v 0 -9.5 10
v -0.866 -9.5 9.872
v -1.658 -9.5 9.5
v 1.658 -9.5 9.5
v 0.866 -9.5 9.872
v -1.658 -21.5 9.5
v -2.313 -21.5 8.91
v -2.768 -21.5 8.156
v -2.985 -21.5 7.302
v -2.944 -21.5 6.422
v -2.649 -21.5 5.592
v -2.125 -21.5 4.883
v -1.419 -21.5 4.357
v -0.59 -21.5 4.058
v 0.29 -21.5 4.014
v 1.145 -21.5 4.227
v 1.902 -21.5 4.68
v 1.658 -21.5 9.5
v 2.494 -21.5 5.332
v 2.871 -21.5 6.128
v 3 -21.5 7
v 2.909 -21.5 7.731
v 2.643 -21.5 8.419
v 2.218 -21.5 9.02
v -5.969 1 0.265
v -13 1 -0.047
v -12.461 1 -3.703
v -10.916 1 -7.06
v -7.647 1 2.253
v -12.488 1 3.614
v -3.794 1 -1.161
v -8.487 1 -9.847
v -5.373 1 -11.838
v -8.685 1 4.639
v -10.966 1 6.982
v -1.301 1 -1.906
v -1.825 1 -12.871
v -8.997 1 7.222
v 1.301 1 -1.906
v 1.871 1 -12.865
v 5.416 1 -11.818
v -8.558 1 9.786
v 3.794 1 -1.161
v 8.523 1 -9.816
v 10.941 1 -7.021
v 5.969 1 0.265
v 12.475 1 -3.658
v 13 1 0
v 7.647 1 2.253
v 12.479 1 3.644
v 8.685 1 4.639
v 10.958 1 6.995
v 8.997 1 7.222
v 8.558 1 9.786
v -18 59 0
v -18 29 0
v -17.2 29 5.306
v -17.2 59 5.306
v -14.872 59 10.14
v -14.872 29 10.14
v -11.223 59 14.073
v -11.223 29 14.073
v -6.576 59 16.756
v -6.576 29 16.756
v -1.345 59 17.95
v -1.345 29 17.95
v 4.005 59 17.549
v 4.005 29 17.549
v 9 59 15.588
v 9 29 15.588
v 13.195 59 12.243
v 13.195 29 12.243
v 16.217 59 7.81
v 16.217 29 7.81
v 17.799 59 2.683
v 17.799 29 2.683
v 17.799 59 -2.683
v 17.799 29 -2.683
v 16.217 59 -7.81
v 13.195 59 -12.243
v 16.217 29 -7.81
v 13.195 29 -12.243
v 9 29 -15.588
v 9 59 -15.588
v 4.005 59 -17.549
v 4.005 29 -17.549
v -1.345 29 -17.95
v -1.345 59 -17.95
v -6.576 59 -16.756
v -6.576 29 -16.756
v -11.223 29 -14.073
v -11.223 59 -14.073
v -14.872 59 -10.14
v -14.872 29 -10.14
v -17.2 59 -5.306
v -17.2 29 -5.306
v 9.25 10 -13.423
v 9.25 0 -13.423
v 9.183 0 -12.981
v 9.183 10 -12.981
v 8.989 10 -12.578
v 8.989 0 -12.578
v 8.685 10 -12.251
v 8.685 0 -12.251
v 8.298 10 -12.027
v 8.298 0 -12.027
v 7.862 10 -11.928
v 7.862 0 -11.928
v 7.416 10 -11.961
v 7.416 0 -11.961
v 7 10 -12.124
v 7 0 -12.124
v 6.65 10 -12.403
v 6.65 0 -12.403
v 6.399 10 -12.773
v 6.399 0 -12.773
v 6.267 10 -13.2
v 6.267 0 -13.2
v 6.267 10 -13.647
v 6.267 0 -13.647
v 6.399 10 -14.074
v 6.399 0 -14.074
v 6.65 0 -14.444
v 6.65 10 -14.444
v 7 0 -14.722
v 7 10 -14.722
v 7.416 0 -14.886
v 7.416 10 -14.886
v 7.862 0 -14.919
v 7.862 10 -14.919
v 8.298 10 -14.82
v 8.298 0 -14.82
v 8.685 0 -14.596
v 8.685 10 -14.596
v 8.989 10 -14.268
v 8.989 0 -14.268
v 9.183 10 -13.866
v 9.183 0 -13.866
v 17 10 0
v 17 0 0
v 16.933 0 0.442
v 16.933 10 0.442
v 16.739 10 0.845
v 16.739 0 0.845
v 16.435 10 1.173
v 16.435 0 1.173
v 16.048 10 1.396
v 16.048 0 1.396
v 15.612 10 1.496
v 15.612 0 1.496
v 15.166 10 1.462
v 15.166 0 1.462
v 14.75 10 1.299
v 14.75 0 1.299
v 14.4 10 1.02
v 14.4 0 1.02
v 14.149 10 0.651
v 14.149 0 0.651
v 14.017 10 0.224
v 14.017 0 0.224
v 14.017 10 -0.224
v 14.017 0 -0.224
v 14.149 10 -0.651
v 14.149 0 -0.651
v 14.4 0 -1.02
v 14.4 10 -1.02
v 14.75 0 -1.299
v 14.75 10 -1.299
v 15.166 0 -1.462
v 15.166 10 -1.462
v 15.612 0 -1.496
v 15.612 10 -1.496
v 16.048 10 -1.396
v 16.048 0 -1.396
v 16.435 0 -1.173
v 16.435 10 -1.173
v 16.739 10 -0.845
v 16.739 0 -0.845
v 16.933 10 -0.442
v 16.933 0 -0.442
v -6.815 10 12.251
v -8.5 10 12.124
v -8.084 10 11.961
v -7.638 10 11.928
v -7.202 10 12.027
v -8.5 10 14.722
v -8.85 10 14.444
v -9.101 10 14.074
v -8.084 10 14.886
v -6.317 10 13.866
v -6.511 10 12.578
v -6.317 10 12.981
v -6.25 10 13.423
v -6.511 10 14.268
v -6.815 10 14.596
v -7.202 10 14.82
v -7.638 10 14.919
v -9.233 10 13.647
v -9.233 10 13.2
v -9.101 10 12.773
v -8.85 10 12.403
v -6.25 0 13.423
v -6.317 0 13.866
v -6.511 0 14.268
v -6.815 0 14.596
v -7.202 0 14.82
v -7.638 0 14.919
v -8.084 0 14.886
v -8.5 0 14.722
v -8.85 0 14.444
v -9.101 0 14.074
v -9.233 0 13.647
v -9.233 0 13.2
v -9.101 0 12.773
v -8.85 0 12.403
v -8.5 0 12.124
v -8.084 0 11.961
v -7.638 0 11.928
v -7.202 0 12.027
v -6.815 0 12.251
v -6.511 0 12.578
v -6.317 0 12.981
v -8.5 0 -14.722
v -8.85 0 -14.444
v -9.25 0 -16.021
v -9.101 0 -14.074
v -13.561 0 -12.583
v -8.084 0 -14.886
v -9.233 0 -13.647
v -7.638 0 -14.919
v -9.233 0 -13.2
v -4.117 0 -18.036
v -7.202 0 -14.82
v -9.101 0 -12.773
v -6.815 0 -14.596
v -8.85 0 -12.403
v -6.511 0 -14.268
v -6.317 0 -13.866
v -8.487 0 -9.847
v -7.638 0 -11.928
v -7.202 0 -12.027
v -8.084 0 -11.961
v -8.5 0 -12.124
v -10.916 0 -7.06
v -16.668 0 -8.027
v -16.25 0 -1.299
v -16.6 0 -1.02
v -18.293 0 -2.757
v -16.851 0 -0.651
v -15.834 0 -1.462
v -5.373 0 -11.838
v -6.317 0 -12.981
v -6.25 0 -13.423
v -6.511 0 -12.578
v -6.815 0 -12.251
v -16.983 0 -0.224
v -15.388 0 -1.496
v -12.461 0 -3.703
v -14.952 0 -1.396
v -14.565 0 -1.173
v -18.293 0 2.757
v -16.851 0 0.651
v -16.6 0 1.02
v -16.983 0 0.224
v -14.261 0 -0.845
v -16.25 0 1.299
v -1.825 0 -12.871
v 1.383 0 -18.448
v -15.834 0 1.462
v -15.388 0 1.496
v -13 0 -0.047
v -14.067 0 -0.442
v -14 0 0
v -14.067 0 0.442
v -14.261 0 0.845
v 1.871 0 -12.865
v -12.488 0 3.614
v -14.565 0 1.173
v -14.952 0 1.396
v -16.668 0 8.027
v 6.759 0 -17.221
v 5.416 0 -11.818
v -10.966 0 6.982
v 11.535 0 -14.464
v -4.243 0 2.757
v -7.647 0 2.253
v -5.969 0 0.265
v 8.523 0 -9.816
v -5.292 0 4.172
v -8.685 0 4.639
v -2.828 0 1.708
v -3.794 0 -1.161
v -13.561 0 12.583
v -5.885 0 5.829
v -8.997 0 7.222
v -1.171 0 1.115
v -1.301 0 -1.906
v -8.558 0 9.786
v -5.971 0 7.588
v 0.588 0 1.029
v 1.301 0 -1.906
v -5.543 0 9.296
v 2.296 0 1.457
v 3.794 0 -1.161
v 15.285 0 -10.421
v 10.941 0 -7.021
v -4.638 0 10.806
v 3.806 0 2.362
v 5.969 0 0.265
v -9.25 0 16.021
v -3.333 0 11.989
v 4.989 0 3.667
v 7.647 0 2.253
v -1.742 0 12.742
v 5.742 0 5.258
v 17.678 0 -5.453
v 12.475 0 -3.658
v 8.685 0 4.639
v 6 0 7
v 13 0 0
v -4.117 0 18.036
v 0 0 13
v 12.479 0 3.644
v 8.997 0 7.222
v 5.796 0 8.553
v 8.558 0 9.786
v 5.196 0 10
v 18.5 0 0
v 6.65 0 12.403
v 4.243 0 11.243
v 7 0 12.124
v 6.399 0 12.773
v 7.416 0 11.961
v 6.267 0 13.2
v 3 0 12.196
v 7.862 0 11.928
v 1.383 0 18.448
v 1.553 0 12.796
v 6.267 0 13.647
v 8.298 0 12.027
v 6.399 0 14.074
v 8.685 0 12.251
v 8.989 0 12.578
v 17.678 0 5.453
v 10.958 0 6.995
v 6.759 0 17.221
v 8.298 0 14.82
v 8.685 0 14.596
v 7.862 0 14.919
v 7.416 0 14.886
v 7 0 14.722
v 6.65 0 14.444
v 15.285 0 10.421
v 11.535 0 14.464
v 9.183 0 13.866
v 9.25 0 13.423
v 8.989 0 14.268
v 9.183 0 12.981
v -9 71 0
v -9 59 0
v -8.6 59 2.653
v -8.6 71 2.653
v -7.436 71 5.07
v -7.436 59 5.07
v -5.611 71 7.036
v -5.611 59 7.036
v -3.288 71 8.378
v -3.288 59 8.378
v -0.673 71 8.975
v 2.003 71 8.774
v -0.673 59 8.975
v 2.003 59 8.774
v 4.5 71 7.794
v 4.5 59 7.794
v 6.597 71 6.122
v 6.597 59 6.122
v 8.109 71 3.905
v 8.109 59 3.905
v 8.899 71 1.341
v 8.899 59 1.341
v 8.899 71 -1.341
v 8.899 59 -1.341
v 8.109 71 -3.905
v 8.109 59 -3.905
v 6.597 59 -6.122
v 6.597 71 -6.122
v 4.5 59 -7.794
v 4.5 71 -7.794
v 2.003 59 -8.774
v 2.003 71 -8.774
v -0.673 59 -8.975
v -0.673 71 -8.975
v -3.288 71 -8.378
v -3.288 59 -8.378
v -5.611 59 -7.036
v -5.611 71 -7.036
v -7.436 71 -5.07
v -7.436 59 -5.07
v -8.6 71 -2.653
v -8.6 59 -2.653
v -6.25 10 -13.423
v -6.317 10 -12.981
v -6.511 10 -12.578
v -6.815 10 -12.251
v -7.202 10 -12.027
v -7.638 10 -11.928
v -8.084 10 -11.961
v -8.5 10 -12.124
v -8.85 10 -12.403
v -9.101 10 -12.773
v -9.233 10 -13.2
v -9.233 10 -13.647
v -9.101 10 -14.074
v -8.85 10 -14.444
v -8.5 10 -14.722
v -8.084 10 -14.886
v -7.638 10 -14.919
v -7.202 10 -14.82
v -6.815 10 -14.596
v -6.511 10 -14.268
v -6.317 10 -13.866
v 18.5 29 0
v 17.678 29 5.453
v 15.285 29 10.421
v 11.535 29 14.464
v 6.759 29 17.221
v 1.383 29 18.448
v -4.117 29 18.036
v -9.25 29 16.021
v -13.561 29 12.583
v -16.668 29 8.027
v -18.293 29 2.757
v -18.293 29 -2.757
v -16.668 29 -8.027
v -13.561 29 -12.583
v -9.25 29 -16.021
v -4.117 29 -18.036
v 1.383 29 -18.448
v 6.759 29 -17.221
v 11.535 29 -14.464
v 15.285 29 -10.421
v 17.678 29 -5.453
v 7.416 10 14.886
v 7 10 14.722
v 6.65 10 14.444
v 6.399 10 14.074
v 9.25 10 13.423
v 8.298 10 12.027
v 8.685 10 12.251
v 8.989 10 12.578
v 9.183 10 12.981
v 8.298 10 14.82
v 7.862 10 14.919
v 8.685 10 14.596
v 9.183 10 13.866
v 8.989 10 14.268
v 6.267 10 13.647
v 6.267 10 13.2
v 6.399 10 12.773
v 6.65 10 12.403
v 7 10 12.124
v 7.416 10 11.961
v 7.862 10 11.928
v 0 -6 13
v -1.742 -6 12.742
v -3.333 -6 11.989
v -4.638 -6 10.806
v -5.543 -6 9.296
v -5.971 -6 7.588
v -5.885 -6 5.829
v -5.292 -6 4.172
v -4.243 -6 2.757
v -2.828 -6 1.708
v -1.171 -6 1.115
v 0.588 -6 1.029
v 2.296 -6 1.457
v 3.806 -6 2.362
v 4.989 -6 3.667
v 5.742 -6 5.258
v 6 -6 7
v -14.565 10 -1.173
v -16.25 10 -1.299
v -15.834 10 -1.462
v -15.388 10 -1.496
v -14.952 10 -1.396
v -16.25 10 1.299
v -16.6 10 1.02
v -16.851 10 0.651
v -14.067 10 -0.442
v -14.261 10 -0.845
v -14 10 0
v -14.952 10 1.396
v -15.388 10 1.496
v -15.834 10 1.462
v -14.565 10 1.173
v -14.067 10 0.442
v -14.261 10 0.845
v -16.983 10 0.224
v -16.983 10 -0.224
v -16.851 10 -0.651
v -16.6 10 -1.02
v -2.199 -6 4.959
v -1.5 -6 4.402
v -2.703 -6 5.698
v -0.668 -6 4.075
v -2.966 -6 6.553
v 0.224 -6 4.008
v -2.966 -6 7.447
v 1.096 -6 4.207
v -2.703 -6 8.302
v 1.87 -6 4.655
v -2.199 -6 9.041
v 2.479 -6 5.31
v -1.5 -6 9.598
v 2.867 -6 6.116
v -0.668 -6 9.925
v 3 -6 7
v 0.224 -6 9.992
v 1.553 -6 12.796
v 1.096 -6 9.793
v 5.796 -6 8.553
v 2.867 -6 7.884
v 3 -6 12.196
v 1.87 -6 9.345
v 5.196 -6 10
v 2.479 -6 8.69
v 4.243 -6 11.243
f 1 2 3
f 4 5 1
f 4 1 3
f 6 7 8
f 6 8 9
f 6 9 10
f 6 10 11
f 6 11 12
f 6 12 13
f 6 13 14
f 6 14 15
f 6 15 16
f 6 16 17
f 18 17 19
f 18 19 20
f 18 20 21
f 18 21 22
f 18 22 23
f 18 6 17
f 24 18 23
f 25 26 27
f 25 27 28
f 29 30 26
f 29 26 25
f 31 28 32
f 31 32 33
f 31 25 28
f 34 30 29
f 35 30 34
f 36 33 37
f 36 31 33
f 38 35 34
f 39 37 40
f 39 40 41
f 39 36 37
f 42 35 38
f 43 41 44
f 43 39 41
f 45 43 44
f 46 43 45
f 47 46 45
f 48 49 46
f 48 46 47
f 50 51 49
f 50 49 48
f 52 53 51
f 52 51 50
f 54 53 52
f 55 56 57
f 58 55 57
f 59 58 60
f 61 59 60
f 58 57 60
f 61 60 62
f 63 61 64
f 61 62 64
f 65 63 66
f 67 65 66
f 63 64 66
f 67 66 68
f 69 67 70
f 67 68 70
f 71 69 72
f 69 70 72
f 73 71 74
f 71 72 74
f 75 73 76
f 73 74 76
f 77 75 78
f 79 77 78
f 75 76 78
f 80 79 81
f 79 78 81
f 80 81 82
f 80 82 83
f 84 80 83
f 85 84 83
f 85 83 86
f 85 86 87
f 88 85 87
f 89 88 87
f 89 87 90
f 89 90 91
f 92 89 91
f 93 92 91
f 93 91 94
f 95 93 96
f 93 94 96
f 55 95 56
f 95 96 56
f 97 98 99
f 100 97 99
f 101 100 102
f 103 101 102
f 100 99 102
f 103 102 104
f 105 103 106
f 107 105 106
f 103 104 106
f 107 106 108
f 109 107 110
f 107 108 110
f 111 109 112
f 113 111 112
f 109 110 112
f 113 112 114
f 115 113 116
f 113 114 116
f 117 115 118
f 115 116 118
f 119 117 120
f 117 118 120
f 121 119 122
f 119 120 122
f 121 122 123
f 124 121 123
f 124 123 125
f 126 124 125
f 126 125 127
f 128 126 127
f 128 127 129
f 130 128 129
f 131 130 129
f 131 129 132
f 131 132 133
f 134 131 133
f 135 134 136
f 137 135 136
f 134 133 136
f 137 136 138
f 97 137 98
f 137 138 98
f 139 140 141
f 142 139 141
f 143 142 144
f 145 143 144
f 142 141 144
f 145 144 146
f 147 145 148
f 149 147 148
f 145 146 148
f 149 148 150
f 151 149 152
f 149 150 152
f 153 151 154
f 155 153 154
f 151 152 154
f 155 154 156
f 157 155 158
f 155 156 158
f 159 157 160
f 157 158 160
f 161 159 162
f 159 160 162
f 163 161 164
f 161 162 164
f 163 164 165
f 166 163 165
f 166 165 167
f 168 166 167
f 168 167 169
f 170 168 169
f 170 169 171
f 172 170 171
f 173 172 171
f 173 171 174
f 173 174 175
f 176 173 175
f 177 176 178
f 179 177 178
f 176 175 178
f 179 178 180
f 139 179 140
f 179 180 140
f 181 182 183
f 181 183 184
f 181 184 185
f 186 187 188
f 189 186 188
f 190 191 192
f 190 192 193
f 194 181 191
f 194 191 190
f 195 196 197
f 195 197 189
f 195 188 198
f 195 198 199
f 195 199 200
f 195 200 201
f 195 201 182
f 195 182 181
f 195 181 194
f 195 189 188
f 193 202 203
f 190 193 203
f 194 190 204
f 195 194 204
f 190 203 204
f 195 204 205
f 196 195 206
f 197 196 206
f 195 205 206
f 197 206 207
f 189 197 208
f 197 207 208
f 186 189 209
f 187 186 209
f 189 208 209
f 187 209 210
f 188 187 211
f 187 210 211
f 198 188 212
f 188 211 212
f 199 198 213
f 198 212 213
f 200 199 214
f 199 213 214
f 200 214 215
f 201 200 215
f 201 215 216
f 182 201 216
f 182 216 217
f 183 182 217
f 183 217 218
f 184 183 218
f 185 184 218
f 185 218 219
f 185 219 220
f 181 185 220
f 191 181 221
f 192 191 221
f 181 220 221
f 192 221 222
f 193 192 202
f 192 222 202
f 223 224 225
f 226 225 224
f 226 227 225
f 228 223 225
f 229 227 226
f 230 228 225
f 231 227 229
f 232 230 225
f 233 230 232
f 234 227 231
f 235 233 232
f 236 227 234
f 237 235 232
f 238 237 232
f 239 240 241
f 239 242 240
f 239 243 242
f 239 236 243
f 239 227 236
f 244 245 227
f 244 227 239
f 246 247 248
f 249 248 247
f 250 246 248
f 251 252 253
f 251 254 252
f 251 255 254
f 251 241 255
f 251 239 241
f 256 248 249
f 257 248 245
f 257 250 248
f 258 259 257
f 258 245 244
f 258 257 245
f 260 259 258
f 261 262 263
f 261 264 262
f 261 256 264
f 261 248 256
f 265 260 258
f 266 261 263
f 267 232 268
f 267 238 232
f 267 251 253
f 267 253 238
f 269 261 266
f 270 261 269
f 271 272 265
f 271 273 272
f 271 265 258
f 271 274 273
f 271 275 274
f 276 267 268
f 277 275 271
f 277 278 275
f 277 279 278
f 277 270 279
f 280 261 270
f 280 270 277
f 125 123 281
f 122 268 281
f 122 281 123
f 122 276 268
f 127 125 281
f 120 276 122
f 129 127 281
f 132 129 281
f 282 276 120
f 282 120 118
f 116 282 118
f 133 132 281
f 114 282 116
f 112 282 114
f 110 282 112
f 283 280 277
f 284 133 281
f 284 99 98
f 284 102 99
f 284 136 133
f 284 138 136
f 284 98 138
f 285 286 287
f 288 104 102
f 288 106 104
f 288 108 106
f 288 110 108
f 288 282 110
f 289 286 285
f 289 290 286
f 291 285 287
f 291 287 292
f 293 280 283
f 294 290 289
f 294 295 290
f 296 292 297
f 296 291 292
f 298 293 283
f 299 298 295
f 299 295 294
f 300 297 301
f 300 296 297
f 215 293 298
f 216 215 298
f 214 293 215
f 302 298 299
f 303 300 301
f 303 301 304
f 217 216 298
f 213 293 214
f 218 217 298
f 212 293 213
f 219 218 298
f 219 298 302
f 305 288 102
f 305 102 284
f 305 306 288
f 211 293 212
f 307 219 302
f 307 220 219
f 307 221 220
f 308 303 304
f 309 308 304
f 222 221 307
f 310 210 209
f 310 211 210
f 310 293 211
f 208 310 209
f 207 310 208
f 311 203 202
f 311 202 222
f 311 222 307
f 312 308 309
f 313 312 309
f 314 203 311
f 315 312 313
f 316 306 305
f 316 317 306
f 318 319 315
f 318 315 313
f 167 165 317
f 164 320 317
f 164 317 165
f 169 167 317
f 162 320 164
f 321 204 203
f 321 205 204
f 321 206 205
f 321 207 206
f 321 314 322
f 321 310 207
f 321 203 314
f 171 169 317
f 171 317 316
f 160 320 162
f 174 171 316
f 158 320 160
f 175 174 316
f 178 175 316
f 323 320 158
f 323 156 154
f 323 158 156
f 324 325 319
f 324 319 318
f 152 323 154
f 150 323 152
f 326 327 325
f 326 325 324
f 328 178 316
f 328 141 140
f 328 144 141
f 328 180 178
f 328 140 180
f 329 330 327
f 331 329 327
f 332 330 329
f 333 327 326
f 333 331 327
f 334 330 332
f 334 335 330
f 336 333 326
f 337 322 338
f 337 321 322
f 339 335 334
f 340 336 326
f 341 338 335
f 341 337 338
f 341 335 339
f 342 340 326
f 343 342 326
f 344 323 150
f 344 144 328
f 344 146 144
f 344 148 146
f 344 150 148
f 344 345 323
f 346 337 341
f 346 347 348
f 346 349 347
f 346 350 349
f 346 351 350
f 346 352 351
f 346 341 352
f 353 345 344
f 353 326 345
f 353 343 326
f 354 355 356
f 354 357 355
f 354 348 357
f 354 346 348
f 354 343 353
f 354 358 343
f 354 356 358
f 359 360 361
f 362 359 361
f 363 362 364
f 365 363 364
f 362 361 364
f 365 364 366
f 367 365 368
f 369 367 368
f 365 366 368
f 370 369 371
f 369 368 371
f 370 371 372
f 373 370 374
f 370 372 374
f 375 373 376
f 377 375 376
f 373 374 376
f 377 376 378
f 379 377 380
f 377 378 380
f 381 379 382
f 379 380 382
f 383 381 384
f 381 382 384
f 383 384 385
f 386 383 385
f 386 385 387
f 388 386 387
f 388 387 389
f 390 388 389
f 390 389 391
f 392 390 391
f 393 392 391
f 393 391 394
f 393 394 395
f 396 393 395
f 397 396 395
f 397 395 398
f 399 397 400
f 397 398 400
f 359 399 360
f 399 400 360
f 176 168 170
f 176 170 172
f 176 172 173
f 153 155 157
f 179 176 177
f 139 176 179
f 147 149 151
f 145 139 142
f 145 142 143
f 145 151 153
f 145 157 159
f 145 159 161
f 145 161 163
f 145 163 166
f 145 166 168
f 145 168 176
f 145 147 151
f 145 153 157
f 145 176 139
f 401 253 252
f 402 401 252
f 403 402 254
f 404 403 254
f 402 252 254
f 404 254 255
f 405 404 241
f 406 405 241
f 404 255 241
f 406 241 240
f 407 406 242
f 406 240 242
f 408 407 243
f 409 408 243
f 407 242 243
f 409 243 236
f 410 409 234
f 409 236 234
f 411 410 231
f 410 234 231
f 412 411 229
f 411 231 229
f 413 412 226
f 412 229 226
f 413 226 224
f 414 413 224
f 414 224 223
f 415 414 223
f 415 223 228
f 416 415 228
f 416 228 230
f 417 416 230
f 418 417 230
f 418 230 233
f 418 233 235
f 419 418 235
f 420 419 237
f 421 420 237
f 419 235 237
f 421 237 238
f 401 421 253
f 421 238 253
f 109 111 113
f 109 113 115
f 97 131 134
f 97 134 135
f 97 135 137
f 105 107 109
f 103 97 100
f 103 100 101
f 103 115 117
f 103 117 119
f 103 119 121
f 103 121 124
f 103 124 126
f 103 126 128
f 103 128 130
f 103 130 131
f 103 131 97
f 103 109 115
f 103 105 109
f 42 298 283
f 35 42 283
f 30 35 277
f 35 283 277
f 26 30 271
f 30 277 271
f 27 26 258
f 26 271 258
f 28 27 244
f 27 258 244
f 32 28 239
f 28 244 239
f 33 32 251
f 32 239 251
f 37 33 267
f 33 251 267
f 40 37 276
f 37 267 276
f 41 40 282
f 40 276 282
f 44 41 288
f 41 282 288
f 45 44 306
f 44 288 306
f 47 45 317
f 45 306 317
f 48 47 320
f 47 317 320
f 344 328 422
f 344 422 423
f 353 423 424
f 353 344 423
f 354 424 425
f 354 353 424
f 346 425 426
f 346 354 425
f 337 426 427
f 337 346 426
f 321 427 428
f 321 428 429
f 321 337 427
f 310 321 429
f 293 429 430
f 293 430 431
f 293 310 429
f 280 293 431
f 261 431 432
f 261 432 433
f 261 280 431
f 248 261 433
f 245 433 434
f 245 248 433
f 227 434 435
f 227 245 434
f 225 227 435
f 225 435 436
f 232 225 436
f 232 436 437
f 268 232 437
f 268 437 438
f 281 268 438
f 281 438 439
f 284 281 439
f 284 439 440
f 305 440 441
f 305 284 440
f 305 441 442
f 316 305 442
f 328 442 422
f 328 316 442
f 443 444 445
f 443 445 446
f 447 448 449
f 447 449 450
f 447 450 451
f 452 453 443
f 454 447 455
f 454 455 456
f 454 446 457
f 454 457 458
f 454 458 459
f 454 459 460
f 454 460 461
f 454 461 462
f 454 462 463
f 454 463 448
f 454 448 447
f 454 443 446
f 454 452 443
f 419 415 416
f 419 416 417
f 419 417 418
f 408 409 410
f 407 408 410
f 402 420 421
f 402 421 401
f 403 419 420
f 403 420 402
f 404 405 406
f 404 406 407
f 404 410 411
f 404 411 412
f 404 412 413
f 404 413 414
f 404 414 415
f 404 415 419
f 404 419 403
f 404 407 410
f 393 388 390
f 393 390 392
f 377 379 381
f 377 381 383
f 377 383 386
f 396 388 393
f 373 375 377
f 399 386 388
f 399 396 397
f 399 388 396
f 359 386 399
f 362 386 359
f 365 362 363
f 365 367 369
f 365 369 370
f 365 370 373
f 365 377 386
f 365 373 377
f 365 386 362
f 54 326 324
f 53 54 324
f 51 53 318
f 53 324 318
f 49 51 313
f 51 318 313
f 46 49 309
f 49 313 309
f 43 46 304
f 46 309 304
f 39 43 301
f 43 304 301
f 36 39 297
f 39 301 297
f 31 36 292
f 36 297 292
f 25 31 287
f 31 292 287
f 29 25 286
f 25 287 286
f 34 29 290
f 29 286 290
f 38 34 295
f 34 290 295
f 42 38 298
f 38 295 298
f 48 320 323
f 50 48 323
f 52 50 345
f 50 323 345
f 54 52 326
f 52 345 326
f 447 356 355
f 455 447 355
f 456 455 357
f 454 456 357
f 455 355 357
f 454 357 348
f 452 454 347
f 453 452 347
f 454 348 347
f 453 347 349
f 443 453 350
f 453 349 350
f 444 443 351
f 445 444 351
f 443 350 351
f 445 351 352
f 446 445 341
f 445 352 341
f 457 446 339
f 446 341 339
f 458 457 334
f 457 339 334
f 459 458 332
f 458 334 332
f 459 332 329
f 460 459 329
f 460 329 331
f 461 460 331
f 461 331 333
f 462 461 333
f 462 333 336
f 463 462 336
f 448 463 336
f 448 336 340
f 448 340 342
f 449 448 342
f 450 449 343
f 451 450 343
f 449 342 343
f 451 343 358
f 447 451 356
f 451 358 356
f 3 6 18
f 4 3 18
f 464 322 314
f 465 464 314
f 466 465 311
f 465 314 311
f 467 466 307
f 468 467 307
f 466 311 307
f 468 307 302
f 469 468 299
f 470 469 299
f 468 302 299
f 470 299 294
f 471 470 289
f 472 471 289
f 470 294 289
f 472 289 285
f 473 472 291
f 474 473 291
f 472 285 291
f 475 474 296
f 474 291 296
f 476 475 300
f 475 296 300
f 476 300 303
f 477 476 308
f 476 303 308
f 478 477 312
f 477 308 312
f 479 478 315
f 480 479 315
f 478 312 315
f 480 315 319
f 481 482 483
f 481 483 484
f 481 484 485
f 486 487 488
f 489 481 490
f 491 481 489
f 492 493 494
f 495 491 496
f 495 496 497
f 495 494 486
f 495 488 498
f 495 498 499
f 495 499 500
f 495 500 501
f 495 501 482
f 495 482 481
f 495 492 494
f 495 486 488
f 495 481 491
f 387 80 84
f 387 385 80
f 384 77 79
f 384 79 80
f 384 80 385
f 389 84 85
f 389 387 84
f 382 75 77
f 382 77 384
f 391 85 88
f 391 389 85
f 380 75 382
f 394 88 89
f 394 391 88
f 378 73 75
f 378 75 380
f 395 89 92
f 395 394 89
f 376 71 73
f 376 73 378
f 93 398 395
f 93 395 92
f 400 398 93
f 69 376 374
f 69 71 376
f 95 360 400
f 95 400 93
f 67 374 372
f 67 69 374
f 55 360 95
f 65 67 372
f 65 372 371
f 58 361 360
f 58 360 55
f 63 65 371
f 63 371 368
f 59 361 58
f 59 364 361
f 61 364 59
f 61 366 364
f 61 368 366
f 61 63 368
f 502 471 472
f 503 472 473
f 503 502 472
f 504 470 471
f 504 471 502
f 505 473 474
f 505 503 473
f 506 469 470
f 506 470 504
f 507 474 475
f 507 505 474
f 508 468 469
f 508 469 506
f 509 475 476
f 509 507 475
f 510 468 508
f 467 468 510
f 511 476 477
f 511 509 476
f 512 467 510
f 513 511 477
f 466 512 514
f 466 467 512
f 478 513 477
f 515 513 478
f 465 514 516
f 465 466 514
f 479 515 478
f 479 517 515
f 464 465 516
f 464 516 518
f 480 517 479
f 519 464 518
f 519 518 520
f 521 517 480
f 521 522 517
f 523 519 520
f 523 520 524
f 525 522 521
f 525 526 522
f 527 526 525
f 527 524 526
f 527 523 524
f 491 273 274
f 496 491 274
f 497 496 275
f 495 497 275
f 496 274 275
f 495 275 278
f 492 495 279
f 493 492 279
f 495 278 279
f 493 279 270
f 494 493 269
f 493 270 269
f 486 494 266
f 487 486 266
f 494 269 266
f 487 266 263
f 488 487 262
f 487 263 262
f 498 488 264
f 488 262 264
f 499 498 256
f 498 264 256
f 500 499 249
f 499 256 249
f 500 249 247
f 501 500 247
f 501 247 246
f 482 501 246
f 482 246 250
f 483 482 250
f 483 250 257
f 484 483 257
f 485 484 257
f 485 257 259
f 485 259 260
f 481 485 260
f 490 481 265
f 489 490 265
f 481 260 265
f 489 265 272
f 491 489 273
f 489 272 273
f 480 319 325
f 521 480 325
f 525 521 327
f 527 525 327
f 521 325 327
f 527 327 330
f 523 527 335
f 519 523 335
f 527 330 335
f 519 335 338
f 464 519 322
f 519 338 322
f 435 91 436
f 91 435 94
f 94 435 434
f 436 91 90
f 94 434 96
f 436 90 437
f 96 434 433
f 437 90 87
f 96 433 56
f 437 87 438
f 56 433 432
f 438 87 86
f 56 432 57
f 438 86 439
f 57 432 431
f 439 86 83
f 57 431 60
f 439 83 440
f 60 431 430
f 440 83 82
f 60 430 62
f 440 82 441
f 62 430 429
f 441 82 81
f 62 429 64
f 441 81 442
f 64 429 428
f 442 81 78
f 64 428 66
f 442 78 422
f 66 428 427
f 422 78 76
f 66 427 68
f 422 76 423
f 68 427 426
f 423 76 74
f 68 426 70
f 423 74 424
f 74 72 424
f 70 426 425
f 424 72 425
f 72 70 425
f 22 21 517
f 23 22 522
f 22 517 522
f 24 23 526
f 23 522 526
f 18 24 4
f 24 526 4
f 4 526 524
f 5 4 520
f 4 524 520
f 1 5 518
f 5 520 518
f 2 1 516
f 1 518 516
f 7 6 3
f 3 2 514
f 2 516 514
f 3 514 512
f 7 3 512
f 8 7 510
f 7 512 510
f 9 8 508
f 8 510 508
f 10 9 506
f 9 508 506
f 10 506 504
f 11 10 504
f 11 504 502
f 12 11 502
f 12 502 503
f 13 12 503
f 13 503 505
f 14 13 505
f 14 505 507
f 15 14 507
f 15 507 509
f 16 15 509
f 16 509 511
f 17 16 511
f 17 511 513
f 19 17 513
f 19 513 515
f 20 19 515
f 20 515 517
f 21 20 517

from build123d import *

# Parameters (mm, degrees)
F0_R      = 18.5
F0_R_2    = 18
F0_R_3    = 1.5
F0_R_4    = 3
F1_DEPTH  = 29
F2_R      = 18
F3_DEPTH  = 30
F4_R      = 9
F5_DEPTH  = 12
F6_DEPTH  = 6
F7_DEPTH  = 21.5
F8_DEPTH  = 10
F10_DEPTH = 12
F11_DEPTH = 1


with BuildPart() as f1:
    # F0 (on Front) → F1 (new body)
    with BuildSketch(Plane.XZ):
        Circle(F0_R)
        Circle(F0_R_2, mode=Mode.SUBTRACT)
        Circle(F0_R_2)
        with Locations((-7.75, -13.4233937587)):
            Circle(F0_R_3, mode=Mode.SUBTRACT)
        with Locations((7.75, -13.4233937587)):
            Circle(F0_R_3, mode=Mode.SUBTRACT)
        with Locations((-15.5, 0)):
            Circle(F0_R_3, mode=Mode.SUBTRACT)
        with Locations((-7.75, 13.4233937587)):
            Circle(F0_R_3, mode=Mode.SUBTRACT)
        with BuildLine():
            ThreePointArc((-8.5580252347, 9.7857142857), (-4.5708705218, 12.1699278007), (-4.3e-08, 13))
            ThreePointArc((-4.3e-08, 13), (4.5708704815, 12.1699278158), (8.5580252347, 9.7857142857))
            ThreePointArc((8.5580252347, 9.7857142857), (11.8375320074, 5.3733449521), (13, 0))
            ThreePointArc((13, 0), (-5.3733449521, -11.8375320074), (-8.5580252347, 9.7857142857))
        make_face(mode=Mode.SUBTRACT)
        with Locations((15.5, 0)):
            Circle(F0_R_3, mode=Mode.SUBTRACT)
        with Locations((7.75, 13.4233937587)):
            Circle(F0_R_3, mode=Mode.SUBTRACT)
        with BuildLine():
            ThreePointArc((13, 0), (11.8375320074, 5.3733449521), (8.5580252347, 9.7857142857))
            ThreePointArc((8.5580252347, 9.7857142857), (0, -2), (-8.5580252347, 9.7857142857))
            ThreePointArc((-8.5580252347, 9.7857142857), (-5.3733449521, -11.8375320074), (13, 0))
        make_face()
        with BuildLine():
            ThreePointArc((8.5580252347, 9.7857142857), (4.5708704815, 12.1699278158), (-4.3e-08, 13))
            ThreePointArc((-4.3e-08, 13), (-4.5708705218, 12.1699278007), (-8.5580252347, 9.7857142857))
            ThreePointArc((-8.5580252347, 9.7857142857), (0, -2), (8.5580252347, 9.7857142857))
        make_face()
        with BuildLine():
            ThreePointArc((-4.3e-08, 13), (4.2426406719, 11.2426407023), (6, 7))
            ThreePointArc((6, 7), (-4.2426406719, 2.7573592977), (-4.3e-08, 13))
        make_face(mode=Mode.SUBTRACT)
        with BuildLine():
            ThreePointArc((-4.3e-08, 13), (-4.2426406719, 2.7573592977), (6, 7))
            ThreePointArc((6, 7), (4.2426406719, 11.2426407023), (-4.3e-08, 13))
        make_face()
        with Locations((0, 7)):
            Circle(F0_R_4, mode=Mode.SUBTRACT)
        with Locations((0, 7)):
            Circle(F0_R_4)
        with Locations((-15.5, 0)):
            Circle(F0_R_3)
        with Locations((7.75, -13.4233937587)):
            Circle(F0_R_3)
        with Locations((15.5, 0)):
            Circle(F0_R_3)
        with Locations((7.75, 13.4233937587)):
            Circle(F0_R_3)
        with Locations((-7.75, -13.4233937587)):
            Circle(F0_R_3)
        with Locations((-7.75, 13.4233937587)):
            Circle(F0_R_3)
    extrude(amount=-F1_DEPTH)

    # F2 (on face) → F3 (join)
    with BuildSketch(Plane(origin=(0, 29, 0), x_dir=(-1, 0, 0), z_dir=(0, 1, 0))):
        Circle(F2_R)
    extrude(amount=F3_DEPTH)

    # F4 (on face) → F5 (join)
    with BuildSketch(Plane(origin=(0, 59, 0), x_dir=(-1, 0, 0), z_dir=(0, 1, 0))):
        Circle(F4_R)
    extrude(amount=F5_DEPTH)

    # F0 (on Front) → F6 (join)
    with BuildSketch(Plane.XZ):
        with BuildLine():
            ThreePointArc((-4.3e-08, 13), (-4.2426406719, 2.7573592977), (6, 7))
            ThreePointArc((6, 7), (4.2426406719, 11.2426407023), (-4.3e-08, 13))
        make_face()
        with Locations((0, 7)):
            Circle(F0_R_4, mode=Mode.SUBTRACT)
    extrude(amount=F6_DEPTH)

    # F0 (on Front) → F7 (join)
    with BuildSketch(Plane.XZ):
        with Locations((0, 7)):
            Circle(F0_R_4)
    extrude(amount=F7_DEPTH)

    # F0 (on Front) → F8 (cut)
    with BuildSketch(Plane.XZ):
        with Locations((-7.75, 13.4233937587)):
            Circle(F0_R_3)
        with Locations((7.75, 13.4233937587)):
            Circle(F0_R_3)
        with Locations((15.5, 0)):
            Circle(F0_R_3)
        with Locations((-7.75, -13.4233937587)):
            Circle(F0_R_3)
        with Locations((-15.5, 0)):
            Circle(F0_R_3)
        with Locations((7.75, -13.4233937587)):
            Circle(F0_R_3)
    extrude(amount=-F8_DEPTH, mode=Mode.SUBTRACT)

    # F9 (on face) → F10 (cut)
    with BuildSketch(Plane.XZ.offset(21.5)):
        with BuildLine():
            ThreePointArc((-1.6583123952, 9.5), (0, 10), (1.6583123952, 9.5))
            Line((1.6583123952, 9.5), (6.0122050345, 9.5))
            Line((6.0122050345, 9.5), (6.0122050345, 13.4357631467))
            Line((6.0122050345, 13.4357631467), (-7.3503456078, 13.4357631467))
            Line((-7.3503456078, 13.4357631467), (-7.3503456078, 9.5))
            Line((-7.3503456078, 9.5), (-1.6583123952, 9.5))
        make_face()
        with BuildLine():
            Line((-1.6583123952, 9.5), (1.6583123952, 9.5))
            ThreePointArc((1.6583123952, 9.5), (0, 10), (-1.6583123952, 9.5))
        make_face()
    extrude(amount=-F10_DEPTH, mode=Mode.SUBTRACT)

    # F0 (on Front) → F11 (cut)
    with BuildSketch(Plane.XZ):
        with BuildLine():
            ThreePointArc((13, 0), (11.8375320074, 5.3733449521), (8.5580252347, 9.7857142857))
            ThreePointArc((8.5580252347, 9.7857142857), (0, -2), (-8.5580252347, 9.7857142857))
            ThreePointArc((-8.5580252347, 9.7857142857), (-5.3733449521, -11.8375320074), (13, 0))
        make_face()
    extrude(amount=-F11_DEPTH, mode=Mode.SUBTRACT)


solid = f1.part
